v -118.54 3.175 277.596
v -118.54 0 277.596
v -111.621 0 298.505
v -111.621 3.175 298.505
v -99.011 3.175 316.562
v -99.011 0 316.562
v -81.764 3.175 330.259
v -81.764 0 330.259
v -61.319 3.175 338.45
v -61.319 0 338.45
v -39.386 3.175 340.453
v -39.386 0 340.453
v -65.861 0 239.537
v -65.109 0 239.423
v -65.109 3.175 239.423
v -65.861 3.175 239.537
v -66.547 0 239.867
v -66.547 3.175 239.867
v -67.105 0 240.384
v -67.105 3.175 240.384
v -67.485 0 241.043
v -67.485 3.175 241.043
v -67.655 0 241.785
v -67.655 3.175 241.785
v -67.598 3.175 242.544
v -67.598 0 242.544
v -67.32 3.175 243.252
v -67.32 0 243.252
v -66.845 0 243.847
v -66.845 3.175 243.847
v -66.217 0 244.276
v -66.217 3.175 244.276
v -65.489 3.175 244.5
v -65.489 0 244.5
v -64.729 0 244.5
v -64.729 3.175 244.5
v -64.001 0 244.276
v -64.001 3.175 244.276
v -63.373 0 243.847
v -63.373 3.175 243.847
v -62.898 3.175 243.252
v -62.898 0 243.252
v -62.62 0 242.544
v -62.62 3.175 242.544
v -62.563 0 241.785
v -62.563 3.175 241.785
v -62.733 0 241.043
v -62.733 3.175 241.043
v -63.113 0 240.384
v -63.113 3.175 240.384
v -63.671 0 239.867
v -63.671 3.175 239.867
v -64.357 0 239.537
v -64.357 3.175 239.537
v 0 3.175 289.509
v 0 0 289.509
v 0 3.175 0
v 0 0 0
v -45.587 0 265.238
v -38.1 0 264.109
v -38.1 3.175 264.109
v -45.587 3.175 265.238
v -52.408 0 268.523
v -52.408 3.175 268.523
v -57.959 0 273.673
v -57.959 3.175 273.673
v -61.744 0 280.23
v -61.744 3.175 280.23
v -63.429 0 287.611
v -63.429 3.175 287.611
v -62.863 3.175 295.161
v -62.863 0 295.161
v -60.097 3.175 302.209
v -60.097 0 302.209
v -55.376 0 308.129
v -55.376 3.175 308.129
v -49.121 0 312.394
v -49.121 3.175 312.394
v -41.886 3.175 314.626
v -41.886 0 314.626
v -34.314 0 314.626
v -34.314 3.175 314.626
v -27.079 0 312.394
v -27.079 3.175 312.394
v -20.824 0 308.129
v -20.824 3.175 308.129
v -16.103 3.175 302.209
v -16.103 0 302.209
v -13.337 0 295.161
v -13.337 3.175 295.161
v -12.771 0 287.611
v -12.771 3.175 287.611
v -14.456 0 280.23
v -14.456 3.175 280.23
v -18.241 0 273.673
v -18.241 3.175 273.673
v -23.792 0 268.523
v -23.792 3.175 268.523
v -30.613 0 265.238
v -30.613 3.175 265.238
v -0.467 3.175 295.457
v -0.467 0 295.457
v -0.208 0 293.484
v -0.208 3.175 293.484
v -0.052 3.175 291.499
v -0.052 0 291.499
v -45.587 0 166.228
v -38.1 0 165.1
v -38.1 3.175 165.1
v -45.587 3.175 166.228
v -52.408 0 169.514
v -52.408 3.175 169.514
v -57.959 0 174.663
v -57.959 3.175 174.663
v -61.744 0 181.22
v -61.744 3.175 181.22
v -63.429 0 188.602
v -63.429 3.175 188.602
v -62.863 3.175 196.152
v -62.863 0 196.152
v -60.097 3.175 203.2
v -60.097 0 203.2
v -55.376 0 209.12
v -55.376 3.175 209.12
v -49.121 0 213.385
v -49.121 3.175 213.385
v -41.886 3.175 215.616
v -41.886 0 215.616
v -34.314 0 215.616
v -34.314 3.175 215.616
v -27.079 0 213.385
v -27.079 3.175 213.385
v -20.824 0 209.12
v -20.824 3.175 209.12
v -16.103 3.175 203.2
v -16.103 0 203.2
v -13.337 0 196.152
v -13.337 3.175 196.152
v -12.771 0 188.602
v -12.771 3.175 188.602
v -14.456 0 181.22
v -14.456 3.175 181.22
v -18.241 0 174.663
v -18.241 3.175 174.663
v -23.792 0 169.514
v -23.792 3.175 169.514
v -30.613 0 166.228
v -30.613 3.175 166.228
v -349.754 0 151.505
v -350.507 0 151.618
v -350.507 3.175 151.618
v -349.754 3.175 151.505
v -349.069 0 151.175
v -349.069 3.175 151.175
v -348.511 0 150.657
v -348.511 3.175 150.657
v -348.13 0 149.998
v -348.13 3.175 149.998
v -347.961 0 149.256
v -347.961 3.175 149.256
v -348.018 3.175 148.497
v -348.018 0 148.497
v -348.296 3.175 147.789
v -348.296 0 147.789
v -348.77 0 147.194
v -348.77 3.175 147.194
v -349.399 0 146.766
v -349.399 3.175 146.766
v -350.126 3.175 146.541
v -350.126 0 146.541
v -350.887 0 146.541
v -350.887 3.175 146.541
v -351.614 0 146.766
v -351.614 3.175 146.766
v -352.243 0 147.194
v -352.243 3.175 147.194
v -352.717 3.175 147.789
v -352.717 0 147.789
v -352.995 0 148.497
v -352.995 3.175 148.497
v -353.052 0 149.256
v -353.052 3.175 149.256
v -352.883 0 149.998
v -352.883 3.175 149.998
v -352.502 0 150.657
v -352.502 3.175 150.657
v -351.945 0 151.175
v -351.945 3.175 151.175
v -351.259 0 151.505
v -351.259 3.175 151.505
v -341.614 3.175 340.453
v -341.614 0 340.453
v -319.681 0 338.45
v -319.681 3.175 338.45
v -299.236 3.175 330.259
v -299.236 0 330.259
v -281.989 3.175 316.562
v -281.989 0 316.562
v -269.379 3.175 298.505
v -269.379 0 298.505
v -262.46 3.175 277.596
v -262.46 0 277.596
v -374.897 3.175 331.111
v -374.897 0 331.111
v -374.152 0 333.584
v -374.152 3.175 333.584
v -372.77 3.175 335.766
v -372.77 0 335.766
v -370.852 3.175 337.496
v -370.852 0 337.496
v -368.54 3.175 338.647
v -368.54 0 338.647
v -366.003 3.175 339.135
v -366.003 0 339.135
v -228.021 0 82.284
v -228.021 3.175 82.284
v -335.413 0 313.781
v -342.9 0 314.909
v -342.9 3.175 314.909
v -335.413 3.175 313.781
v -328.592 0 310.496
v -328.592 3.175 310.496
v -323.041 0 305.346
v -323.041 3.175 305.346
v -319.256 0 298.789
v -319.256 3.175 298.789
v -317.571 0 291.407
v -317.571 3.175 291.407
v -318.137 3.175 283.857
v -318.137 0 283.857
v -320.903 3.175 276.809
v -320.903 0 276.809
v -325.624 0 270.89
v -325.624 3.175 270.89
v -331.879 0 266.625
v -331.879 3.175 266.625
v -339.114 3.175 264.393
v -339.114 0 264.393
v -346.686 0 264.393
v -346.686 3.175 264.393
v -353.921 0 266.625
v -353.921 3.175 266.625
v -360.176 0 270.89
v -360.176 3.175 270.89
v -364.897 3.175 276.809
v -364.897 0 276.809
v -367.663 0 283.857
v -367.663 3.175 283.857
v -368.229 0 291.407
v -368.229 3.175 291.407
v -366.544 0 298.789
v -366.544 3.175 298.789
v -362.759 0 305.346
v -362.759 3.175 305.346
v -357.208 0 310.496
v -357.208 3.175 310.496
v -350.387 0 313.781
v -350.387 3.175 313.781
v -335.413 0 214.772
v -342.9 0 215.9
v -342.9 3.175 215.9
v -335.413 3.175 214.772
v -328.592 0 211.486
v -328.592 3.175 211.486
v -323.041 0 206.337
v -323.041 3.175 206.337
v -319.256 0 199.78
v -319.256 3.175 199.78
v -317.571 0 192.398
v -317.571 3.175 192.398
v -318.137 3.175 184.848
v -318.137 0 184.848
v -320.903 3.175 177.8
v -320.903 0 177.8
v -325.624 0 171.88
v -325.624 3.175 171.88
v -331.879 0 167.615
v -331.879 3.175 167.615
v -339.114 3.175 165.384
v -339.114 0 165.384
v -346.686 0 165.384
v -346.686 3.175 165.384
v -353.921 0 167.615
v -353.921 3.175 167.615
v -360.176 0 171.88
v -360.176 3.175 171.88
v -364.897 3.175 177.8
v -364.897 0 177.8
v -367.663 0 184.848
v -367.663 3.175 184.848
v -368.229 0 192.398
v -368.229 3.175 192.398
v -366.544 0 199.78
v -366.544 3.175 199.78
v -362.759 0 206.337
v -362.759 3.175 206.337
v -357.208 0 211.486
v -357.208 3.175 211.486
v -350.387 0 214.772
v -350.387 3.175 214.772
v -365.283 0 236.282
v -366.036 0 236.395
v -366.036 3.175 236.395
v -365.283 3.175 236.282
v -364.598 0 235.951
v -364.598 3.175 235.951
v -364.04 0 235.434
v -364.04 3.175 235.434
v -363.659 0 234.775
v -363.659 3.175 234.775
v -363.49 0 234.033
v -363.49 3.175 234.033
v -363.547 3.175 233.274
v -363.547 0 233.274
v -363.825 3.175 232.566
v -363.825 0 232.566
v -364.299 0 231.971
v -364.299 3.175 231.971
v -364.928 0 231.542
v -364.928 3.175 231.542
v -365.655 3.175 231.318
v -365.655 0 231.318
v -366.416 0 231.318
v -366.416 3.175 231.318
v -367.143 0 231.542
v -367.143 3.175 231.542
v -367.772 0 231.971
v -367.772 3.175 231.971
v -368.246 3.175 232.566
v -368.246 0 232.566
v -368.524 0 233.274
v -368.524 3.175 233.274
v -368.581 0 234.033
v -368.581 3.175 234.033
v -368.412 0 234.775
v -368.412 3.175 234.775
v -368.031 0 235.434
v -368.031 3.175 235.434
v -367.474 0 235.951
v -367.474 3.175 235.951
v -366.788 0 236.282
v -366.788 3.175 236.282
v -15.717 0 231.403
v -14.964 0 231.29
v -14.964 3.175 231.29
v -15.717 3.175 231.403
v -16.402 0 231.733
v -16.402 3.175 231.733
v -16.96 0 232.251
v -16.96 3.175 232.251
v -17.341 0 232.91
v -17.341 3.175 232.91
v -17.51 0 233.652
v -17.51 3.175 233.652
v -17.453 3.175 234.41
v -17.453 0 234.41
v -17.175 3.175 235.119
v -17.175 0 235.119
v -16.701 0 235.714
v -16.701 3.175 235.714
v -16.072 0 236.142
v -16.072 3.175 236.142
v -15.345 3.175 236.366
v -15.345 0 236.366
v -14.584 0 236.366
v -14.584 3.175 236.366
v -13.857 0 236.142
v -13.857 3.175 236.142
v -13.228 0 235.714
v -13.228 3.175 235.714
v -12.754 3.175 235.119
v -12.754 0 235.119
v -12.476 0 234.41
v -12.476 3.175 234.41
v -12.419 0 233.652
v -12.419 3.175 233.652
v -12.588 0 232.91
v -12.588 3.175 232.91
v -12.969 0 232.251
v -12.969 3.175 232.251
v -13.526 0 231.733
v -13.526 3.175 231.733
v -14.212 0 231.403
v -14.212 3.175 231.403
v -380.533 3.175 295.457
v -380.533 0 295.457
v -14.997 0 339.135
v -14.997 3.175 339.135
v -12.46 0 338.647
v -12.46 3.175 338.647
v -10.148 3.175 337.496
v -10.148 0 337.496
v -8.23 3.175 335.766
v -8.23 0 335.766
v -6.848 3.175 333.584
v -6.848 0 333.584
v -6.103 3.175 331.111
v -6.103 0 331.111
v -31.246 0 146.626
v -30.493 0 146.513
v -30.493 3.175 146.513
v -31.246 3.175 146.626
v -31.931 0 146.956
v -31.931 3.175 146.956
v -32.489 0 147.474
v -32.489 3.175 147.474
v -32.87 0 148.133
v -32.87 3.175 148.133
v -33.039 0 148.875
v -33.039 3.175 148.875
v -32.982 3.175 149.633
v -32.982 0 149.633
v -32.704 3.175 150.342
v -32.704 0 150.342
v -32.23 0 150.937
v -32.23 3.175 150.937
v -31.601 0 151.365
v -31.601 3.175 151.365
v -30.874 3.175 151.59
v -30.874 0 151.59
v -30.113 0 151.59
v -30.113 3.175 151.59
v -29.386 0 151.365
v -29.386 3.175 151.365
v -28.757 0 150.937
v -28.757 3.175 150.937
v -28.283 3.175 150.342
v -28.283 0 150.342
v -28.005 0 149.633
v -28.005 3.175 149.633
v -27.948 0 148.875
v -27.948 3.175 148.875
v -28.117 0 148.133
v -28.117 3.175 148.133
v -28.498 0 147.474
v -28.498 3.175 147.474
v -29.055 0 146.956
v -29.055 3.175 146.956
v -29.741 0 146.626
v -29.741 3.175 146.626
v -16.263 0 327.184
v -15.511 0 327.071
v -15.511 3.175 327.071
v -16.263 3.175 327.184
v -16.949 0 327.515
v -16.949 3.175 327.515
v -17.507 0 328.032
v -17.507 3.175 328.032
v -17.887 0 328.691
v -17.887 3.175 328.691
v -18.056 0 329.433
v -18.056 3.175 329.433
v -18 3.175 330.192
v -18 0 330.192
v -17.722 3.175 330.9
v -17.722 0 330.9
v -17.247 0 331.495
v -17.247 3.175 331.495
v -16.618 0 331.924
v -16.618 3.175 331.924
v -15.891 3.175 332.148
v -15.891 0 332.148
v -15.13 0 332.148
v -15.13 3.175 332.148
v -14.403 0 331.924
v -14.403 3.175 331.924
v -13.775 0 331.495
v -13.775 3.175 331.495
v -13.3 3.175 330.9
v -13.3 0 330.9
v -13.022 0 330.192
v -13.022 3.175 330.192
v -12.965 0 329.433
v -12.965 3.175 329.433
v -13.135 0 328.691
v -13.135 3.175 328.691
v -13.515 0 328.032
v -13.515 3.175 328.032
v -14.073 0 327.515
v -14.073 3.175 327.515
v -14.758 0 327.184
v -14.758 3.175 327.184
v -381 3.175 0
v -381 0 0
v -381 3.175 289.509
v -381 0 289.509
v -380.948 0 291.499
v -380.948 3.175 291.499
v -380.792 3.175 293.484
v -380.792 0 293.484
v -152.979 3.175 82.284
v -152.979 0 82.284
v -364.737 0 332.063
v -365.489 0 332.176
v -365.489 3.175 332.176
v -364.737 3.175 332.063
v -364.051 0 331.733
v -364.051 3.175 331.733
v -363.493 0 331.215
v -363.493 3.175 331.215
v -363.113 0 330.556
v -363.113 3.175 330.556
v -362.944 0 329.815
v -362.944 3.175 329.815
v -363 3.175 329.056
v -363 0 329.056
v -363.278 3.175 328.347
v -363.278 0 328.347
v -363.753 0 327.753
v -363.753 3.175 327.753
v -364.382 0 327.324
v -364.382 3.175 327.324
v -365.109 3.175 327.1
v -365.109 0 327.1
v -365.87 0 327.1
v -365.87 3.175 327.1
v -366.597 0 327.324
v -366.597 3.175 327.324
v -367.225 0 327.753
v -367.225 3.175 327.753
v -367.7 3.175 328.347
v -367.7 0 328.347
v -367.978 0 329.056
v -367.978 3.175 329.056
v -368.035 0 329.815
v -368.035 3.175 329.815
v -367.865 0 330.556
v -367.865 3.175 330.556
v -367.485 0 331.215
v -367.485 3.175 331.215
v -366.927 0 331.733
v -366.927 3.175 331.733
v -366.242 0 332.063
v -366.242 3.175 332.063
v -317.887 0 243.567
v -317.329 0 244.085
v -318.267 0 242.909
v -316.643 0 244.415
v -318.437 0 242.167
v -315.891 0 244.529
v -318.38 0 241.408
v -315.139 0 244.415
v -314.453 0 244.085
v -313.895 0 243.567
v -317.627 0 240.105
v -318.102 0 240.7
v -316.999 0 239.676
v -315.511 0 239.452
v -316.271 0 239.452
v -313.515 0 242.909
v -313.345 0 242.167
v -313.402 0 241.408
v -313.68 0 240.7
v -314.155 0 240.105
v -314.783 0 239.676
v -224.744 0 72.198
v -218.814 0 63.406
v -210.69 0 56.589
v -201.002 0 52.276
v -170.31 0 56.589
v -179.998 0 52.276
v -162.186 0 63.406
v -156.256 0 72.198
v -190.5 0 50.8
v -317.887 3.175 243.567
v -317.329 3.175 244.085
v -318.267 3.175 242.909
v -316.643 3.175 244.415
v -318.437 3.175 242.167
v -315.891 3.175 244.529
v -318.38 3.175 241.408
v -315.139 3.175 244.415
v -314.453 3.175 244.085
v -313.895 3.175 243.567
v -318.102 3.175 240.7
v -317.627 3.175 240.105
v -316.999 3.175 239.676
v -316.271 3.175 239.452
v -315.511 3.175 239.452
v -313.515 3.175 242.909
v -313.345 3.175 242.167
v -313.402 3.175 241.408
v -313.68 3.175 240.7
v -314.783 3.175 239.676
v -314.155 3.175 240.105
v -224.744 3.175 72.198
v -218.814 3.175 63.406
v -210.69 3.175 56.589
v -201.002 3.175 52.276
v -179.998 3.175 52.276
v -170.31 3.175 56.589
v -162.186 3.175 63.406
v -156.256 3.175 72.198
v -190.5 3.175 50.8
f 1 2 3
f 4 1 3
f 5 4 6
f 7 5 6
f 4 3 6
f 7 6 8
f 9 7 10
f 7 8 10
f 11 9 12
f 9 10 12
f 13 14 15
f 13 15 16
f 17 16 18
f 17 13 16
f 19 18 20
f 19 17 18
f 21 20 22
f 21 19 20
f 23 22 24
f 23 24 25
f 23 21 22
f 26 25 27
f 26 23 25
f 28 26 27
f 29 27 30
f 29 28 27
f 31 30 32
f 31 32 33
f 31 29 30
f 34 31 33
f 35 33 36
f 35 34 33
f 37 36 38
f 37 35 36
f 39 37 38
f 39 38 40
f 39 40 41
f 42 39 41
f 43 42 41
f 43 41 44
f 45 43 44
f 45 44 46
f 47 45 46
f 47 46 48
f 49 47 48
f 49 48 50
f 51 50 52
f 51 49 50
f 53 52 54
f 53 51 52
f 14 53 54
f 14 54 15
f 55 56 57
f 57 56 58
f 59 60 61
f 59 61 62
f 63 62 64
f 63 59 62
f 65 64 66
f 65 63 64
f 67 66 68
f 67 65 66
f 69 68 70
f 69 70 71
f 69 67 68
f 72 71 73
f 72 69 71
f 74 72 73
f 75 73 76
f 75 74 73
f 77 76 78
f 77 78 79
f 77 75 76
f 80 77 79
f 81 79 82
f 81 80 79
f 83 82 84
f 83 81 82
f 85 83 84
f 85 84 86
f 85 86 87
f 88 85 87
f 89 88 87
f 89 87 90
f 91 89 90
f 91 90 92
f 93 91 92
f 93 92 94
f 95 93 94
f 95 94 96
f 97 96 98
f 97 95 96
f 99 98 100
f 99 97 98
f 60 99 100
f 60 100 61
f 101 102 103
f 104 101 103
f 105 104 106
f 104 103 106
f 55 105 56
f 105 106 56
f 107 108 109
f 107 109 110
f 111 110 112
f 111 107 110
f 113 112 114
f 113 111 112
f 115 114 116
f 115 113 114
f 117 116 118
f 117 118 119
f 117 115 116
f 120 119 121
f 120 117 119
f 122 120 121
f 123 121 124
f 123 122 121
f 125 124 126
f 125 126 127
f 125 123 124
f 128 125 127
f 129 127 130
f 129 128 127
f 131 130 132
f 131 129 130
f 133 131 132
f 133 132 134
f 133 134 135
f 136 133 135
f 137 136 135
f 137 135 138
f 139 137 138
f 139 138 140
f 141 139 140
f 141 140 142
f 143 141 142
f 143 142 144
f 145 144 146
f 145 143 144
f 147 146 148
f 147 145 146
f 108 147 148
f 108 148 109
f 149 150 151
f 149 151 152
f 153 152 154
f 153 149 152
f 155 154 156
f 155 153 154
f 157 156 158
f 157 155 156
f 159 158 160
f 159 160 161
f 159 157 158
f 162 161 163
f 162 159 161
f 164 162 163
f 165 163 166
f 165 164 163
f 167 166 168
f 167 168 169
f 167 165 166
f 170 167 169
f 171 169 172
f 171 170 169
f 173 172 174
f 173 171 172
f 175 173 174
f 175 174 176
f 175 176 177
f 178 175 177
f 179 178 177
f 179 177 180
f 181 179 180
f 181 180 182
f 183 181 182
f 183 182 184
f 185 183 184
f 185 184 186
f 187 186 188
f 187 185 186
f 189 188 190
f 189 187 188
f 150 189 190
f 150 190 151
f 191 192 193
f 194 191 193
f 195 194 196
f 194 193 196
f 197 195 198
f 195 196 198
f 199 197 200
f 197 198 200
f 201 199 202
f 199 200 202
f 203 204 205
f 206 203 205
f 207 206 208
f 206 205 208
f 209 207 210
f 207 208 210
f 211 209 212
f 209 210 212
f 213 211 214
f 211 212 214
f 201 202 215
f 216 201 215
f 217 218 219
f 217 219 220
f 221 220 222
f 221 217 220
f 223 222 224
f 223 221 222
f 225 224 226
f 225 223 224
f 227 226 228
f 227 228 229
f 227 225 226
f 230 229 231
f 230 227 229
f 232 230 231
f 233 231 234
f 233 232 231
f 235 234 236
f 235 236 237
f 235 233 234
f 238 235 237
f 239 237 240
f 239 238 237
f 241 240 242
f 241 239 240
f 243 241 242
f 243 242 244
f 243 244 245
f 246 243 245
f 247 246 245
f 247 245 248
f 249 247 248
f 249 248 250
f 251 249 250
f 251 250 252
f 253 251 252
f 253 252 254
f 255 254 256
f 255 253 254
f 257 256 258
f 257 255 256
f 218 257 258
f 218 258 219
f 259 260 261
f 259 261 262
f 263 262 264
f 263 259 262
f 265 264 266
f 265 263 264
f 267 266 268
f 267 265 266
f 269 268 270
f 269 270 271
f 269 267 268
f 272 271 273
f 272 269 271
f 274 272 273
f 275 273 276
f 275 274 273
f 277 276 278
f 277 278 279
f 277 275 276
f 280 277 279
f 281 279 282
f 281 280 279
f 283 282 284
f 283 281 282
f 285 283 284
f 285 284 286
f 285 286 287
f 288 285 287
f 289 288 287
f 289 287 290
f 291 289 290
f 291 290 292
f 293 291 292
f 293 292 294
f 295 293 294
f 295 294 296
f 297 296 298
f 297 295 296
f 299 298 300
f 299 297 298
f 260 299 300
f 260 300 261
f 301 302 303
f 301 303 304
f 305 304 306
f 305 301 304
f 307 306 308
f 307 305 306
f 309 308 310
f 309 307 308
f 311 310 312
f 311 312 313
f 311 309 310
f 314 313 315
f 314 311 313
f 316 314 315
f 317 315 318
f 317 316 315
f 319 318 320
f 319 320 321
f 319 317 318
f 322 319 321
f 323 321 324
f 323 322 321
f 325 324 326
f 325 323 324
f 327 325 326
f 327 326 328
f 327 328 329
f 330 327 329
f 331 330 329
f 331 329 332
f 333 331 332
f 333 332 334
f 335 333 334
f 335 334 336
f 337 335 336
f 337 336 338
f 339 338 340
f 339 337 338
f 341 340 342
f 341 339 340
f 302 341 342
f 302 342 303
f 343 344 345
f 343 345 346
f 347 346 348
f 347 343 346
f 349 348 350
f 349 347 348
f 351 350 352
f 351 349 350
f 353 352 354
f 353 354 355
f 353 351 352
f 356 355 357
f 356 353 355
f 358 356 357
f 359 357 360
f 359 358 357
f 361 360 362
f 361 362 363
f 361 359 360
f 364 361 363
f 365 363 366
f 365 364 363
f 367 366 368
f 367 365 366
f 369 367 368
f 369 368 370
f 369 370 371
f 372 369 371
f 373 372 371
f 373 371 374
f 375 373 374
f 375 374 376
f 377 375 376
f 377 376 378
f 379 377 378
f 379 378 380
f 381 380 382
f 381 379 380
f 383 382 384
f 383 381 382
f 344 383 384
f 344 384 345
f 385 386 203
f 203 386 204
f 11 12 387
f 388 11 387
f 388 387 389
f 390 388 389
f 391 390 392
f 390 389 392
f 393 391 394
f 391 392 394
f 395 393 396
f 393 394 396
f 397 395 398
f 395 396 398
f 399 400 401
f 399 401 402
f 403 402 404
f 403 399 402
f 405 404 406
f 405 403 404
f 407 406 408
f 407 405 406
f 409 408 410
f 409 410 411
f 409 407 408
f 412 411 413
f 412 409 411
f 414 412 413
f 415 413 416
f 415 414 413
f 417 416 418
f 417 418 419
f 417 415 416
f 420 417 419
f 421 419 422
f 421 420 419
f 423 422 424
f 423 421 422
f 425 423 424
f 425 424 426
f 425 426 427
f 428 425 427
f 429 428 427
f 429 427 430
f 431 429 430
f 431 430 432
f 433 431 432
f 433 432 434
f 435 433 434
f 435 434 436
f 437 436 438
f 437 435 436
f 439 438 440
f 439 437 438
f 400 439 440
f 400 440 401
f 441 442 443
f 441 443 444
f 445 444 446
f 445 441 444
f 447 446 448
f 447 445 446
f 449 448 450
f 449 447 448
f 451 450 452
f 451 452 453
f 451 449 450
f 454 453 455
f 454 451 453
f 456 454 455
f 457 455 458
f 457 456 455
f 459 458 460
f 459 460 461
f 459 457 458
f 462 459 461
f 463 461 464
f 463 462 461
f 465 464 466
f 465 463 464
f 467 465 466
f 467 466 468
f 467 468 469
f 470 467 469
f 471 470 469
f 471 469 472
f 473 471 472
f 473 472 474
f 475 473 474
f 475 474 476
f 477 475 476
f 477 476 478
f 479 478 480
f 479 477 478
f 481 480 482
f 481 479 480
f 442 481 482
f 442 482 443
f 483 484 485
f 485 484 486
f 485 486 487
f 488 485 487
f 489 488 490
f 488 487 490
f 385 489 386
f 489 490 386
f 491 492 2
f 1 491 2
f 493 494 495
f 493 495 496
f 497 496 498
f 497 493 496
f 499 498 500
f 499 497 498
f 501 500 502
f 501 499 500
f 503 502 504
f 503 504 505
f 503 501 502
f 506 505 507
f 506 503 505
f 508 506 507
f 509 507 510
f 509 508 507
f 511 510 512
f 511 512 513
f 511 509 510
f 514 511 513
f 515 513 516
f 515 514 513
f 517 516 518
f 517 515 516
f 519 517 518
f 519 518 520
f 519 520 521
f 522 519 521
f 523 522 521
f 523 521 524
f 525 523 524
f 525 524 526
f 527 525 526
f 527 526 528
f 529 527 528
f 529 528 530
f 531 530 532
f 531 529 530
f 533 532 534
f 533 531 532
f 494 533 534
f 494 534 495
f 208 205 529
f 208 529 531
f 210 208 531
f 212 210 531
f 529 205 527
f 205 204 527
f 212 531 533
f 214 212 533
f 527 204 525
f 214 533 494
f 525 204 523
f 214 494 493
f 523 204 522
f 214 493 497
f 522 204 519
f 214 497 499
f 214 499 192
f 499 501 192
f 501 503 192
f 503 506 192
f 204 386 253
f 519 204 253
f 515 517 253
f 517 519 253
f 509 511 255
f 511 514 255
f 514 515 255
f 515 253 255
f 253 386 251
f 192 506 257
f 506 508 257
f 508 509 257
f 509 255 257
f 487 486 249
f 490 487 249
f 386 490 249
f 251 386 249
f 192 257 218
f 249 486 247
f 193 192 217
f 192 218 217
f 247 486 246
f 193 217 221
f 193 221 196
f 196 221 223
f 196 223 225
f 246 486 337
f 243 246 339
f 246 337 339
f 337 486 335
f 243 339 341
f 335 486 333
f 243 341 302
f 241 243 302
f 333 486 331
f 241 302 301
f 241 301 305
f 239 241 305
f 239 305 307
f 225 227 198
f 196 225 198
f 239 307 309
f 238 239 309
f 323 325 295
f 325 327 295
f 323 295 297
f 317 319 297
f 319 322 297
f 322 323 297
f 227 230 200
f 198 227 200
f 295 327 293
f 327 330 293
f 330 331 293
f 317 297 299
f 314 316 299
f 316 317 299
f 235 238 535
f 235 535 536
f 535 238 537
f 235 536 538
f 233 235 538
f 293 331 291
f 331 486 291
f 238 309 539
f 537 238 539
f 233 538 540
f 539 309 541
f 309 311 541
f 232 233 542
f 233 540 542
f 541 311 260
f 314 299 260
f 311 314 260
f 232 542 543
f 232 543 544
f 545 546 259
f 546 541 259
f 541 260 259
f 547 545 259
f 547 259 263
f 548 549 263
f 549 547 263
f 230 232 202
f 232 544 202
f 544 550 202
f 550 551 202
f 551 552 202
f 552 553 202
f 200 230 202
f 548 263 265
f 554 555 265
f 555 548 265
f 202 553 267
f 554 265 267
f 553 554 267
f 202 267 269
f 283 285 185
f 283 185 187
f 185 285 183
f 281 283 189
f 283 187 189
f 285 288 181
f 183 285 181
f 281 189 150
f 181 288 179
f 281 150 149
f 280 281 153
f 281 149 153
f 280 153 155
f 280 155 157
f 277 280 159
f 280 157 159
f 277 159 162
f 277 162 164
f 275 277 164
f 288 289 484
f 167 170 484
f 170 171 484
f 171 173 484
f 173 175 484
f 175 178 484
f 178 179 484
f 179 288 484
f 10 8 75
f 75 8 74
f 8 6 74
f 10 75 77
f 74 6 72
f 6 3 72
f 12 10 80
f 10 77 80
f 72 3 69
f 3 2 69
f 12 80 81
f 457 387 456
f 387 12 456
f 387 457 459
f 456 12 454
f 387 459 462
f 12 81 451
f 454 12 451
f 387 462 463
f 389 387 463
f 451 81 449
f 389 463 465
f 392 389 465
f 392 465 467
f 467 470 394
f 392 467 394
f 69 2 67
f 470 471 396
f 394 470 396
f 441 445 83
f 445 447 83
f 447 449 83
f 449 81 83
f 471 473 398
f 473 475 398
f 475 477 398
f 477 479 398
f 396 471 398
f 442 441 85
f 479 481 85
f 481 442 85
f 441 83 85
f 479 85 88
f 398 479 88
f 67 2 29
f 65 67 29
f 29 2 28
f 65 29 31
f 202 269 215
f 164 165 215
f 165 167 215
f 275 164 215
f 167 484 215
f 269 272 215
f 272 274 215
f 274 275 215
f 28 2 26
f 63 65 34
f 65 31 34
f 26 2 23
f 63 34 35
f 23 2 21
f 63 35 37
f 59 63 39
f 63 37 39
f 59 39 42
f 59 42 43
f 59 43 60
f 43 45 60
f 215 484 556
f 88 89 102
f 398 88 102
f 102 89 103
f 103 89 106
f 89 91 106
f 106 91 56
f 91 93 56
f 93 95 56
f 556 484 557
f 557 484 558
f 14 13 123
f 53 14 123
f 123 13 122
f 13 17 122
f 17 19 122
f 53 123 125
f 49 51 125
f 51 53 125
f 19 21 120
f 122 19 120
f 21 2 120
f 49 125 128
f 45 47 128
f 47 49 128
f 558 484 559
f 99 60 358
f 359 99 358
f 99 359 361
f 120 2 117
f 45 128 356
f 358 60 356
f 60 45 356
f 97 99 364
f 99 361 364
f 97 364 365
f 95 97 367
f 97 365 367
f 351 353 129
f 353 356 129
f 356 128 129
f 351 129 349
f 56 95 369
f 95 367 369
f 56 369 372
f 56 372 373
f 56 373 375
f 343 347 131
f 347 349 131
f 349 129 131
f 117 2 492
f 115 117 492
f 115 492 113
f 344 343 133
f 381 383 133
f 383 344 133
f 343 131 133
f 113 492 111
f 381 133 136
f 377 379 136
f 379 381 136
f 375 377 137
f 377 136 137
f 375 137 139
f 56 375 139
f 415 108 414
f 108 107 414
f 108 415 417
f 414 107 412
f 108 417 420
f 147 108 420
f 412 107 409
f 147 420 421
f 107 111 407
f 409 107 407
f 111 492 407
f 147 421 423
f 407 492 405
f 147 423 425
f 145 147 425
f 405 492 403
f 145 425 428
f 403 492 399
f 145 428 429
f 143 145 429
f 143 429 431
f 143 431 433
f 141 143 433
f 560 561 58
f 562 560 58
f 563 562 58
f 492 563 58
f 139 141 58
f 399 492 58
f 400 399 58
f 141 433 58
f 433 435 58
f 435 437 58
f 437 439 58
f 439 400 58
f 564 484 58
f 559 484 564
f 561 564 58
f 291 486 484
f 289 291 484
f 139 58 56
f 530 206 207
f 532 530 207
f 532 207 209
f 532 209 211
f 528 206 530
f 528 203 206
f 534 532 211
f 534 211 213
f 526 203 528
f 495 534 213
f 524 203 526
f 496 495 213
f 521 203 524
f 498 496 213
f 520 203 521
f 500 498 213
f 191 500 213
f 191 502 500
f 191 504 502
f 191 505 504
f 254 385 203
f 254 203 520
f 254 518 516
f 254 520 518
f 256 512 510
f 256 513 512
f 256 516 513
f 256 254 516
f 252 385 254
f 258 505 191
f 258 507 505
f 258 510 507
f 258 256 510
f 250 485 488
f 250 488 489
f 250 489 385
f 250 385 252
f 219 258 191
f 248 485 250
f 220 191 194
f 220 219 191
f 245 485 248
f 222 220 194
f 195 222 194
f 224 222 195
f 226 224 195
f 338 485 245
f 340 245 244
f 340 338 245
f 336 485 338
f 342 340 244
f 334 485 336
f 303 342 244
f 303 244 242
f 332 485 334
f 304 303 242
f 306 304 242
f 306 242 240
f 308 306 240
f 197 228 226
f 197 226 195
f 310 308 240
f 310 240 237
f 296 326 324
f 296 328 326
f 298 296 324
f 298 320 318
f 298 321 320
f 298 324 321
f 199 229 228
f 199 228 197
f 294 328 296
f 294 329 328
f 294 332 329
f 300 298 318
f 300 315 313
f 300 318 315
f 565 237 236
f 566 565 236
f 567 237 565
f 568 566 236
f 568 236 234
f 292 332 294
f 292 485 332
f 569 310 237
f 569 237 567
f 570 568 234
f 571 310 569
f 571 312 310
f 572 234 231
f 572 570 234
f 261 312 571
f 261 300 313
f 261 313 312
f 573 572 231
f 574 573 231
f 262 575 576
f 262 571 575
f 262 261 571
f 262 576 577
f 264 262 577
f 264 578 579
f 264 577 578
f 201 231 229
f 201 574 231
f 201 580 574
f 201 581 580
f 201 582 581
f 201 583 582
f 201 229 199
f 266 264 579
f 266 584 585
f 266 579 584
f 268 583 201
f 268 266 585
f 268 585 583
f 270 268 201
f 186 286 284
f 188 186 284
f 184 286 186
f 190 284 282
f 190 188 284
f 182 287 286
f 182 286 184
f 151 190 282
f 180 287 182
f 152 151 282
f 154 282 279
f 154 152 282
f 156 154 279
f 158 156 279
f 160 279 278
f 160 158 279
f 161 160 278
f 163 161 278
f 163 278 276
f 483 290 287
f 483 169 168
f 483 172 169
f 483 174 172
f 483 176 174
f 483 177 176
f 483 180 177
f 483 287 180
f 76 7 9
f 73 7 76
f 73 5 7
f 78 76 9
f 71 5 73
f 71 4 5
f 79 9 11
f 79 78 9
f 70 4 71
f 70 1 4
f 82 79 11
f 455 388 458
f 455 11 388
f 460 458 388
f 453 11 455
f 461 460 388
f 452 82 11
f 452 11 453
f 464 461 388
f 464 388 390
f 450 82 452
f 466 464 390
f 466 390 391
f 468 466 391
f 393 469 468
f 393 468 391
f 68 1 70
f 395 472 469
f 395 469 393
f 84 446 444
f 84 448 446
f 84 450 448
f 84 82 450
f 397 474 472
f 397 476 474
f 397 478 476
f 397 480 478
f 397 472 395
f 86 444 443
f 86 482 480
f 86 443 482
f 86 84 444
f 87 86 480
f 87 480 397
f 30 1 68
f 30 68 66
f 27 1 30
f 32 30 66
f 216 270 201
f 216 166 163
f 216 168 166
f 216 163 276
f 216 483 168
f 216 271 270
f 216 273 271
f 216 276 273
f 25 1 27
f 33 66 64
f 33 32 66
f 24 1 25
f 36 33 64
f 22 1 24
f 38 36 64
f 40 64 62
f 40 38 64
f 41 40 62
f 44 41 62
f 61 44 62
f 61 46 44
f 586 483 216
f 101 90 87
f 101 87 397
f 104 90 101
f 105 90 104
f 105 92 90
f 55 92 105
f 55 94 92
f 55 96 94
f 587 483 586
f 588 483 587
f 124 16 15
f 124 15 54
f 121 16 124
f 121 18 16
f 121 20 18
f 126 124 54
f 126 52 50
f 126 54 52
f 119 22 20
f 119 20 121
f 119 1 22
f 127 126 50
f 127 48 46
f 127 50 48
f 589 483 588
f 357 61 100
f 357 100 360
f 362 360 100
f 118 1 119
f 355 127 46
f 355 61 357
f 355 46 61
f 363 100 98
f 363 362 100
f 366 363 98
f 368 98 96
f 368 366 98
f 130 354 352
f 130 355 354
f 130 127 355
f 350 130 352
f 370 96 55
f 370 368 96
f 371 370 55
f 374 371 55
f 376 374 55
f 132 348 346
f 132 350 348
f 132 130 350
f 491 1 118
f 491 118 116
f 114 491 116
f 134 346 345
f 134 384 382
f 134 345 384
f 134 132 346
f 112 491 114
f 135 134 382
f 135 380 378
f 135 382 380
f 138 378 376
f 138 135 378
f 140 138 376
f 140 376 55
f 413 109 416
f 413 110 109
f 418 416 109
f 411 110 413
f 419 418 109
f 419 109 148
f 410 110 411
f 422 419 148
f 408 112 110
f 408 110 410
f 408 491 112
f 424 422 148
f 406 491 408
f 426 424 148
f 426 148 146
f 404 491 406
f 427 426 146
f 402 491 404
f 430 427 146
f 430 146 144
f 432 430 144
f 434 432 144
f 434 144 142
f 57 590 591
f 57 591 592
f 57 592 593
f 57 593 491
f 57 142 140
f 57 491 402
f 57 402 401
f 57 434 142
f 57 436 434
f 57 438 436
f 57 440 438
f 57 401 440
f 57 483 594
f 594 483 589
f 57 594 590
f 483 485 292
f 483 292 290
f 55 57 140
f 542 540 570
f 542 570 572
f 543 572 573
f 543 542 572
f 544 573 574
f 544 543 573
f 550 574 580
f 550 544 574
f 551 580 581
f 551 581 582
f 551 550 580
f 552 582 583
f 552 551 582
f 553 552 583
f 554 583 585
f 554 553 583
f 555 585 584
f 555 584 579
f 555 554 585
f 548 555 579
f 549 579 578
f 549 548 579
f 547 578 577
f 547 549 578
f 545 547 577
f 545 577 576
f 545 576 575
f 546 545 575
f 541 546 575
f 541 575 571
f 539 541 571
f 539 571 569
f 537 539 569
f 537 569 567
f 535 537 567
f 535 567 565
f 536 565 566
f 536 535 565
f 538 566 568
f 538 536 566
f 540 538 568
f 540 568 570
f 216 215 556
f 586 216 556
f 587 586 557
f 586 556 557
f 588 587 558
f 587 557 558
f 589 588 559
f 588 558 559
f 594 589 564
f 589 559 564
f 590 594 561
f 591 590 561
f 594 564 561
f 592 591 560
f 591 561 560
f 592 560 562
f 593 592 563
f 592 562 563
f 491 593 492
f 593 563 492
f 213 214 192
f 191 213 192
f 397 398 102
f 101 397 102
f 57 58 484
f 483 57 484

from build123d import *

# Parameters (mm, degrees)
SKETCH1_R           = 25.4
SKETCH1_R_2         = 2.5527
BOSS_EXTRUDE1_DEPTH = 3.175


with BuildPart() as part:
    # Sketch1 → Boss-Extrude1 (new body)
    with BuildSketch(Plane(origin=(0, 0, 0), x_dir=(1, 0, 0), z_dir=(0, 1, 0))):
        with BuildLine():
            Line((0, 0), (-381, 0))
            Line((-381, 0), (-381, -289.5092))
            ThreePointArc((-381, -289.5092), (-380.883021338, -292.492501864), (-380.532803674, -295.457484428))
            Line((-380.532803674, -295.457484428), (-374.89739058, -331.110855945))
            ThreePointArc((-374.89739058, -331.110855945), (-371.869518463, -336.696056706), (-366.003133246, -339.134909219))
            Line((-366.003133246, -339.134909219), (-341.613815414, -340.452811597))
            ThreePointArc((-341.613815414, -340.452811597), (-290.115080631, -324.037048347), (-262.459915955, -277.595807687))
            Line((-262.459915955, -277.595807687), (-228.02117539, -82.284004431))
            ThreePointArc((-228.02117539, -82.284004431), (-190.5, -50.8), (-152.97882461, -82.284004431))
            Line((-152.97882461, -82.284004431), (-118.540084045, -277.595807687))
            ThreePointArc((-118.540084045, -277.595807687), (-90.884919369, -324.037048347), (-39.386184586, -340.452811597))
            Line((-39.386184586, -340.452811597), (-14.996866754, -339.134909219))
            ThreePointArc((-14.996866754, -339.134909219), (-9.130481537, -336.696056706), (-6.10260942, -331.110855945))
            Line((-6.10260942, -331.110855945), (-0.467196326, -295.457484428))
            ThreePointArc((-0.467196326, -295.457484428), (-0.116978662, -292.492501864), (0, -289.5092))
            Line((0, -289.5092), (0, 0))
        make_face()
        with Locations(Location((-342.9, -190.5, 0), (0, 0, 270))):
            Circle(SKETCH1_R, mode=Mode.SUBTRACT)
        with Locations(Location((-350.506535266, -149.065461092, 0), (0, 0, 270))):
            Circle(SKETCH1_R_2, mode=Mode.SUBTRACT)
        with Locations(Location((-342.9, -289.5092, 0), (0, 0, 270))):
            Circle(SKETCH1_R, mode=Mode.SUBTRACT)
        with Locations(Location((-365.489189661, -329.623784838, 0), (0, 0, 270))):
            Circle(SKETCH1_R_2, mode=Mode.SUBTRACT)
        with Locations(Location((-366.035610617, -233.842290605, 0), (0, 0, 270))):
            Circle(SKETCH1_R_2, mode=Mode.SUBTRACT)
        with Locations(Location((-315.890976945, -241.97590689, 0), (0, 0, 270))):
            Circle(SKETCH1_R_2, mode=Mode.SUBTRACT)
        with Locations(Location((-65.109023055, -241.97590689, 0), (0, 0, 90))):
            Circle(SKETCH1_R_2, mode=Mode.SUBTRACT)
        with Locations(Location((-14.964389383, -233.842290605, 0), (0, 0, 90))):
            Circle(SKETCH1_R_2, mode=Mode.SUBTRACT)
        with Locations(Location((-15.510810339, -329.623784838, 0), (0, 0, 90))):
            Circle(SKETCH1_R_2, mode=Mode.SUBTRACT)
        with Locations(Location((-38.1, -289.5092, 0), (0, 0, 90))):
            Circle(SKETCH1_R, mode=Mode.SUBTRACT)
        with Locations(Location((-30.493464734, -149.065461092, 0), (0, 0, 90))):
            Circle(SKETCH1_R_2, mode=Mode.SUBTRACT)
        with Locations(Location((-38.1, -190.5, 0), (0, 0, 90))):
            Circle(SKETCH1_R, mode=Mode.SUBTRACT)
    extrude(amount=BOSS_EXTRUDE1_DEPTH)


solid = part.part
